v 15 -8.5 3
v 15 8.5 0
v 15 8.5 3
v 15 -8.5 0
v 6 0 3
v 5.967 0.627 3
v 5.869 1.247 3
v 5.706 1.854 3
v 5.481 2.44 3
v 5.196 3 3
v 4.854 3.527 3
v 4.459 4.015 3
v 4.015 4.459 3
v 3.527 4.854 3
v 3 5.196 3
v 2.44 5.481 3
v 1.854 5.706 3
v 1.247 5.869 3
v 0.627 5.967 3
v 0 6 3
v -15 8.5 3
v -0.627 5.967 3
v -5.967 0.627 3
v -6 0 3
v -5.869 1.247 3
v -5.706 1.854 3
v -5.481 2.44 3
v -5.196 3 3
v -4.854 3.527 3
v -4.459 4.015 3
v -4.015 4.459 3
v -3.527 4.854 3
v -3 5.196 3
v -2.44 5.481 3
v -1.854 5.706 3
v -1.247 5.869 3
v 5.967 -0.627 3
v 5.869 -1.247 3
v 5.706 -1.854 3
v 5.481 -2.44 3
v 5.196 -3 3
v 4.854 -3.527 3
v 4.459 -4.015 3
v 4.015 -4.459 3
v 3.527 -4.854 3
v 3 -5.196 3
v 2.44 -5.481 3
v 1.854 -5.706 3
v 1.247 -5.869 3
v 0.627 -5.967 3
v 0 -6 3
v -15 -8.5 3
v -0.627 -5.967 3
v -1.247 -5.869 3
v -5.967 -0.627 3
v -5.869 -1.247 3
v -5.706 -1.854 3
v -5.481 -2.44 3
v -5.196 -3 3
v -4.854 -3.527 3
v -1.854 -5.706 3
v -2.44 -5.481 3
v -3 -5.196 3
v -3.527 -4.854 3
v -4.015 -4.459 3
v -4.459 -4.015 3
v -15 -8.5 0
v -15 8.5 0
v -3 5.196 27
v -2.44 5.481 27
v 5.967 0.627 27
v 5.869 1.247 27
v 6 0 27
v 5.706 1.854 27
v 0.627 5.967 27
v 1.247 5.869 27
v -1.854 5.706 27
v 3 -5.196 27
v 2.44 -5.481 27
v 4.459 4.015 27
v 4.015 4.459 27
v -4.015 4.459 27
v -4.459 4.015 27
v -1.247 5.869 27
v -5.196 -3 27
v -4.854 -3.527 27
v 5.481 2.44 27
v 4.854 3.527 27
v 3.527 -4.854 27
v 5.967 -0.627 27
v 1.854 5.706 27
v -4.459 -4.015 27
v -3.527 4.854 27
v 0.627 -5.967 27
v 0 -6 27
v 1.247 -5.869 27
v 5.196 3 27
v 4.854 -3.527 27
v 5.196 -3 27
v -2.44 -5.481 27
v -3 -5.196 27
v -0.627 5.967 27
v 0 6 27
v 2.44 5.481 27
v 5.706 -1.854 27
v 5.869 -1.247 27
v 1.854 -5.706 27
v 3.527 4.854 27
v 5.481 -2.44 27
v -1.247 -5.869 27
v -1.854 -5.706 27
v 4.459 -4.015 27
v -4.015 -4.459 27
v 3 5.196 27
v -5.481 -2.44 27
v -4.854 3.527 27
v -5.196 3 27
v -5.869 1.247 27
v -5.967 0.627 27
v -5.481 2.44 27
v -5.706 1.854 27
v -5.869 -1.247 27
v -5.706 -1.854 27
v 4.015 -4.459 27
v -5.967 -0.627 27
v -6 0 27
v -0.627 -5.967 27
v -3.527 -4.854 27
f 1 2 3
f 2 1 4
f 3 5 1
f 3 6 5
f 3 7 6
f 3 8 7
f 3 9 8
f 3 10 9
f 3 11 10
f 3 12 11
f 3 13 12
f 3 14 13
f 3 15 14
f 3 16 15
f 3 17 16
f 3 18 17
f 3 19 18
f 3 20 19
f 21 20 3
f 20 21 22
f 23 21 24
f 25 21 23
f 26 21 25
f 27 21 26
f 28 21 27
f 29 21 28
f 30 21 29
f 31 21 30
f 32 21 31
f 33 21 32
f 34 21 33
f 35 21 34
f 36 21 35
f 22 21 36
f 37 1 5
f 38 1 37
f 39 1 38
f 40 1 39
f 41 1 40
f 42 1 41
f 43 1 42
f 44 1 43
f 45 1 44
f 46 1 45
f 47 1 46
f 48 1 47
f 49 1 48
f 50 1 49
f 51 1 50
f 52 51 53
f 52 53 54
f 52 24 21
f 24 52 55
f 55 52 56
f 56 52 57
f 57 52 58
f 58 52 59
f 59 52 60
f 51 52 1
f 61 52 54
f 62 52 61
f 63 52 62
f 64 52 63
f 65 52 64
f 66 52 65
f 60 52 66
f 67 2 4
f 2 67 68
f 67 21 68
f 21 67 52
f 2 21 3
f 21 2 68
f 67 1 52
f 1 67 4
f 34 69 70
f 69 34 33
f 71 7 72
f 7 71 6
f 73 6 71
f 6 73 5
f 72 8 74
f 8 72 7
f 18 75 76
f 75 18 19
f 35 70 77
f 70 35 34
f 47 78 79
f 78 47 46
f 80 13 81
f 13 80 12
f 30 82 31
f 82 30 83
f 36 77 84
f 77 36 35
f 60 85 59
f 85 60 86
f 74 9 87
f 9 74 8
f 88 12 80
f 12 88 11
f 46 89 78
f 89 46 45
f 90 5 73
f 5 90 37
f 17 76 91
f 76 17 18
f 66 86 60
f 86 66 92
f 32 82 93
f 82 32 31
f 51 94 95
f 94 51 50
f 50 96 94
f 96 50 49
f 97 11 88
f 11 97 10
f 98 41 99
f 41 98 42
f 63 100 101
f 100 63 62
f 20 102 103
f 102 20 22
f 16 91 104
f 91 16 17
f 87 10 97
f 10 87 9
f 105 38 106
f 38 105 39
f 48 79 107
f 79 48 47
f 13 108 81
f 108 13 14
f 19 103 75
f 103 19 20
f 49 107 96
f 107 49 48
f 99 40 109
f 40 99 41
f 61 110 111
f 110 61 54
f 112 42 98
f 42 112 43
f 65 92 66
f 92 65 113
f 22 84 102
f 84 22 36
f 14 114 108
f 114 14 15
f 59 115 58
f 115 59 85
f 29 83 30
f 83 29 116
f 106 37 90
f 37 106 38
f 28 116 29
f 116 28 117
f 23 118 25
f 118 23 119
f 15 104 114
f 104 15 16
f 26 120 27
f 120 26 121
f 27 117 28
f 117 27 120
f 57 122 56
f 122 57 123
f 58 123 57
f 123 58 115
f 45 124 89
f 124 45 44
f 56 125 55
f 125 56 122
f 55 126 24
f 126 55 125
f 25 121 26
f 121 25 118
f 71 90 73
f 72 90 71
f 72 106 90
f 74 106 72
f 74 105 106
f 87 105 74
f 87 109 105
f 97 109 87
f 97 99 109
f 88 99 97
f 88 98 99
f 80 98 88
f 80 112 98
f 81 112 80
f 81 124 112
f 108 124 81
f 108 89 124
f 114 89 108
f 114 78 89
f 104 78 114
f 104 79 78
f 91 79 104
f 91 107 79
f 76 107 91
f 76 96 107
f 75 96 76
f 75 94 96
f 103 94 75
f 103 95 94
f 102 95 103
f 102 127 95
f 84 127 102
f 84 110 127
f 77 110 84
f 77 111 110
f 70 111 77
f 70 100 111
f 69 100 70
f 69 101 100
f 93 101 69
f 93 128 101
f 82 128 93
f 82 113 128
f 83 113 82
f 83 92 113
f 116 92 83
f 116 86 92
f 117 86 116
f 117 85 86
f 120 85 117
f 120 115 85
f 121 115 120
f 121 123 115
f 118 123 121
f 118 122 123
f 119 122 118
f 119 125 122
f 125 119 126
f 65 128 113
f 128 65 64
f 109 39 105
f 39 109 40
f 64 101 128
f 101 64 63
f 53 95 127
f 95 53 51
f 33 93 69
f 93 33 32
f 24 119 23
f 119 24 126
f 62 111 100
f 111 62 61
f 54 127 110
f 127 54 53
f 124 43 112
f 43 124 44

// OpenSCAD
// T-head slot bolt.
$fn = 60;
eps = 0.02;
shaft_d = 12;
head_l = 30;
shaft_l = 24;
head_w = shaft_d + 5;
head_h = 3;
union() {
    translate([-head_l/2,-head_w/2,0]) cube([head_l,head_w,head_h]);
    translate([0,0,head_h]) cylinder(d=shaft_d,h=shaft_l);
}
